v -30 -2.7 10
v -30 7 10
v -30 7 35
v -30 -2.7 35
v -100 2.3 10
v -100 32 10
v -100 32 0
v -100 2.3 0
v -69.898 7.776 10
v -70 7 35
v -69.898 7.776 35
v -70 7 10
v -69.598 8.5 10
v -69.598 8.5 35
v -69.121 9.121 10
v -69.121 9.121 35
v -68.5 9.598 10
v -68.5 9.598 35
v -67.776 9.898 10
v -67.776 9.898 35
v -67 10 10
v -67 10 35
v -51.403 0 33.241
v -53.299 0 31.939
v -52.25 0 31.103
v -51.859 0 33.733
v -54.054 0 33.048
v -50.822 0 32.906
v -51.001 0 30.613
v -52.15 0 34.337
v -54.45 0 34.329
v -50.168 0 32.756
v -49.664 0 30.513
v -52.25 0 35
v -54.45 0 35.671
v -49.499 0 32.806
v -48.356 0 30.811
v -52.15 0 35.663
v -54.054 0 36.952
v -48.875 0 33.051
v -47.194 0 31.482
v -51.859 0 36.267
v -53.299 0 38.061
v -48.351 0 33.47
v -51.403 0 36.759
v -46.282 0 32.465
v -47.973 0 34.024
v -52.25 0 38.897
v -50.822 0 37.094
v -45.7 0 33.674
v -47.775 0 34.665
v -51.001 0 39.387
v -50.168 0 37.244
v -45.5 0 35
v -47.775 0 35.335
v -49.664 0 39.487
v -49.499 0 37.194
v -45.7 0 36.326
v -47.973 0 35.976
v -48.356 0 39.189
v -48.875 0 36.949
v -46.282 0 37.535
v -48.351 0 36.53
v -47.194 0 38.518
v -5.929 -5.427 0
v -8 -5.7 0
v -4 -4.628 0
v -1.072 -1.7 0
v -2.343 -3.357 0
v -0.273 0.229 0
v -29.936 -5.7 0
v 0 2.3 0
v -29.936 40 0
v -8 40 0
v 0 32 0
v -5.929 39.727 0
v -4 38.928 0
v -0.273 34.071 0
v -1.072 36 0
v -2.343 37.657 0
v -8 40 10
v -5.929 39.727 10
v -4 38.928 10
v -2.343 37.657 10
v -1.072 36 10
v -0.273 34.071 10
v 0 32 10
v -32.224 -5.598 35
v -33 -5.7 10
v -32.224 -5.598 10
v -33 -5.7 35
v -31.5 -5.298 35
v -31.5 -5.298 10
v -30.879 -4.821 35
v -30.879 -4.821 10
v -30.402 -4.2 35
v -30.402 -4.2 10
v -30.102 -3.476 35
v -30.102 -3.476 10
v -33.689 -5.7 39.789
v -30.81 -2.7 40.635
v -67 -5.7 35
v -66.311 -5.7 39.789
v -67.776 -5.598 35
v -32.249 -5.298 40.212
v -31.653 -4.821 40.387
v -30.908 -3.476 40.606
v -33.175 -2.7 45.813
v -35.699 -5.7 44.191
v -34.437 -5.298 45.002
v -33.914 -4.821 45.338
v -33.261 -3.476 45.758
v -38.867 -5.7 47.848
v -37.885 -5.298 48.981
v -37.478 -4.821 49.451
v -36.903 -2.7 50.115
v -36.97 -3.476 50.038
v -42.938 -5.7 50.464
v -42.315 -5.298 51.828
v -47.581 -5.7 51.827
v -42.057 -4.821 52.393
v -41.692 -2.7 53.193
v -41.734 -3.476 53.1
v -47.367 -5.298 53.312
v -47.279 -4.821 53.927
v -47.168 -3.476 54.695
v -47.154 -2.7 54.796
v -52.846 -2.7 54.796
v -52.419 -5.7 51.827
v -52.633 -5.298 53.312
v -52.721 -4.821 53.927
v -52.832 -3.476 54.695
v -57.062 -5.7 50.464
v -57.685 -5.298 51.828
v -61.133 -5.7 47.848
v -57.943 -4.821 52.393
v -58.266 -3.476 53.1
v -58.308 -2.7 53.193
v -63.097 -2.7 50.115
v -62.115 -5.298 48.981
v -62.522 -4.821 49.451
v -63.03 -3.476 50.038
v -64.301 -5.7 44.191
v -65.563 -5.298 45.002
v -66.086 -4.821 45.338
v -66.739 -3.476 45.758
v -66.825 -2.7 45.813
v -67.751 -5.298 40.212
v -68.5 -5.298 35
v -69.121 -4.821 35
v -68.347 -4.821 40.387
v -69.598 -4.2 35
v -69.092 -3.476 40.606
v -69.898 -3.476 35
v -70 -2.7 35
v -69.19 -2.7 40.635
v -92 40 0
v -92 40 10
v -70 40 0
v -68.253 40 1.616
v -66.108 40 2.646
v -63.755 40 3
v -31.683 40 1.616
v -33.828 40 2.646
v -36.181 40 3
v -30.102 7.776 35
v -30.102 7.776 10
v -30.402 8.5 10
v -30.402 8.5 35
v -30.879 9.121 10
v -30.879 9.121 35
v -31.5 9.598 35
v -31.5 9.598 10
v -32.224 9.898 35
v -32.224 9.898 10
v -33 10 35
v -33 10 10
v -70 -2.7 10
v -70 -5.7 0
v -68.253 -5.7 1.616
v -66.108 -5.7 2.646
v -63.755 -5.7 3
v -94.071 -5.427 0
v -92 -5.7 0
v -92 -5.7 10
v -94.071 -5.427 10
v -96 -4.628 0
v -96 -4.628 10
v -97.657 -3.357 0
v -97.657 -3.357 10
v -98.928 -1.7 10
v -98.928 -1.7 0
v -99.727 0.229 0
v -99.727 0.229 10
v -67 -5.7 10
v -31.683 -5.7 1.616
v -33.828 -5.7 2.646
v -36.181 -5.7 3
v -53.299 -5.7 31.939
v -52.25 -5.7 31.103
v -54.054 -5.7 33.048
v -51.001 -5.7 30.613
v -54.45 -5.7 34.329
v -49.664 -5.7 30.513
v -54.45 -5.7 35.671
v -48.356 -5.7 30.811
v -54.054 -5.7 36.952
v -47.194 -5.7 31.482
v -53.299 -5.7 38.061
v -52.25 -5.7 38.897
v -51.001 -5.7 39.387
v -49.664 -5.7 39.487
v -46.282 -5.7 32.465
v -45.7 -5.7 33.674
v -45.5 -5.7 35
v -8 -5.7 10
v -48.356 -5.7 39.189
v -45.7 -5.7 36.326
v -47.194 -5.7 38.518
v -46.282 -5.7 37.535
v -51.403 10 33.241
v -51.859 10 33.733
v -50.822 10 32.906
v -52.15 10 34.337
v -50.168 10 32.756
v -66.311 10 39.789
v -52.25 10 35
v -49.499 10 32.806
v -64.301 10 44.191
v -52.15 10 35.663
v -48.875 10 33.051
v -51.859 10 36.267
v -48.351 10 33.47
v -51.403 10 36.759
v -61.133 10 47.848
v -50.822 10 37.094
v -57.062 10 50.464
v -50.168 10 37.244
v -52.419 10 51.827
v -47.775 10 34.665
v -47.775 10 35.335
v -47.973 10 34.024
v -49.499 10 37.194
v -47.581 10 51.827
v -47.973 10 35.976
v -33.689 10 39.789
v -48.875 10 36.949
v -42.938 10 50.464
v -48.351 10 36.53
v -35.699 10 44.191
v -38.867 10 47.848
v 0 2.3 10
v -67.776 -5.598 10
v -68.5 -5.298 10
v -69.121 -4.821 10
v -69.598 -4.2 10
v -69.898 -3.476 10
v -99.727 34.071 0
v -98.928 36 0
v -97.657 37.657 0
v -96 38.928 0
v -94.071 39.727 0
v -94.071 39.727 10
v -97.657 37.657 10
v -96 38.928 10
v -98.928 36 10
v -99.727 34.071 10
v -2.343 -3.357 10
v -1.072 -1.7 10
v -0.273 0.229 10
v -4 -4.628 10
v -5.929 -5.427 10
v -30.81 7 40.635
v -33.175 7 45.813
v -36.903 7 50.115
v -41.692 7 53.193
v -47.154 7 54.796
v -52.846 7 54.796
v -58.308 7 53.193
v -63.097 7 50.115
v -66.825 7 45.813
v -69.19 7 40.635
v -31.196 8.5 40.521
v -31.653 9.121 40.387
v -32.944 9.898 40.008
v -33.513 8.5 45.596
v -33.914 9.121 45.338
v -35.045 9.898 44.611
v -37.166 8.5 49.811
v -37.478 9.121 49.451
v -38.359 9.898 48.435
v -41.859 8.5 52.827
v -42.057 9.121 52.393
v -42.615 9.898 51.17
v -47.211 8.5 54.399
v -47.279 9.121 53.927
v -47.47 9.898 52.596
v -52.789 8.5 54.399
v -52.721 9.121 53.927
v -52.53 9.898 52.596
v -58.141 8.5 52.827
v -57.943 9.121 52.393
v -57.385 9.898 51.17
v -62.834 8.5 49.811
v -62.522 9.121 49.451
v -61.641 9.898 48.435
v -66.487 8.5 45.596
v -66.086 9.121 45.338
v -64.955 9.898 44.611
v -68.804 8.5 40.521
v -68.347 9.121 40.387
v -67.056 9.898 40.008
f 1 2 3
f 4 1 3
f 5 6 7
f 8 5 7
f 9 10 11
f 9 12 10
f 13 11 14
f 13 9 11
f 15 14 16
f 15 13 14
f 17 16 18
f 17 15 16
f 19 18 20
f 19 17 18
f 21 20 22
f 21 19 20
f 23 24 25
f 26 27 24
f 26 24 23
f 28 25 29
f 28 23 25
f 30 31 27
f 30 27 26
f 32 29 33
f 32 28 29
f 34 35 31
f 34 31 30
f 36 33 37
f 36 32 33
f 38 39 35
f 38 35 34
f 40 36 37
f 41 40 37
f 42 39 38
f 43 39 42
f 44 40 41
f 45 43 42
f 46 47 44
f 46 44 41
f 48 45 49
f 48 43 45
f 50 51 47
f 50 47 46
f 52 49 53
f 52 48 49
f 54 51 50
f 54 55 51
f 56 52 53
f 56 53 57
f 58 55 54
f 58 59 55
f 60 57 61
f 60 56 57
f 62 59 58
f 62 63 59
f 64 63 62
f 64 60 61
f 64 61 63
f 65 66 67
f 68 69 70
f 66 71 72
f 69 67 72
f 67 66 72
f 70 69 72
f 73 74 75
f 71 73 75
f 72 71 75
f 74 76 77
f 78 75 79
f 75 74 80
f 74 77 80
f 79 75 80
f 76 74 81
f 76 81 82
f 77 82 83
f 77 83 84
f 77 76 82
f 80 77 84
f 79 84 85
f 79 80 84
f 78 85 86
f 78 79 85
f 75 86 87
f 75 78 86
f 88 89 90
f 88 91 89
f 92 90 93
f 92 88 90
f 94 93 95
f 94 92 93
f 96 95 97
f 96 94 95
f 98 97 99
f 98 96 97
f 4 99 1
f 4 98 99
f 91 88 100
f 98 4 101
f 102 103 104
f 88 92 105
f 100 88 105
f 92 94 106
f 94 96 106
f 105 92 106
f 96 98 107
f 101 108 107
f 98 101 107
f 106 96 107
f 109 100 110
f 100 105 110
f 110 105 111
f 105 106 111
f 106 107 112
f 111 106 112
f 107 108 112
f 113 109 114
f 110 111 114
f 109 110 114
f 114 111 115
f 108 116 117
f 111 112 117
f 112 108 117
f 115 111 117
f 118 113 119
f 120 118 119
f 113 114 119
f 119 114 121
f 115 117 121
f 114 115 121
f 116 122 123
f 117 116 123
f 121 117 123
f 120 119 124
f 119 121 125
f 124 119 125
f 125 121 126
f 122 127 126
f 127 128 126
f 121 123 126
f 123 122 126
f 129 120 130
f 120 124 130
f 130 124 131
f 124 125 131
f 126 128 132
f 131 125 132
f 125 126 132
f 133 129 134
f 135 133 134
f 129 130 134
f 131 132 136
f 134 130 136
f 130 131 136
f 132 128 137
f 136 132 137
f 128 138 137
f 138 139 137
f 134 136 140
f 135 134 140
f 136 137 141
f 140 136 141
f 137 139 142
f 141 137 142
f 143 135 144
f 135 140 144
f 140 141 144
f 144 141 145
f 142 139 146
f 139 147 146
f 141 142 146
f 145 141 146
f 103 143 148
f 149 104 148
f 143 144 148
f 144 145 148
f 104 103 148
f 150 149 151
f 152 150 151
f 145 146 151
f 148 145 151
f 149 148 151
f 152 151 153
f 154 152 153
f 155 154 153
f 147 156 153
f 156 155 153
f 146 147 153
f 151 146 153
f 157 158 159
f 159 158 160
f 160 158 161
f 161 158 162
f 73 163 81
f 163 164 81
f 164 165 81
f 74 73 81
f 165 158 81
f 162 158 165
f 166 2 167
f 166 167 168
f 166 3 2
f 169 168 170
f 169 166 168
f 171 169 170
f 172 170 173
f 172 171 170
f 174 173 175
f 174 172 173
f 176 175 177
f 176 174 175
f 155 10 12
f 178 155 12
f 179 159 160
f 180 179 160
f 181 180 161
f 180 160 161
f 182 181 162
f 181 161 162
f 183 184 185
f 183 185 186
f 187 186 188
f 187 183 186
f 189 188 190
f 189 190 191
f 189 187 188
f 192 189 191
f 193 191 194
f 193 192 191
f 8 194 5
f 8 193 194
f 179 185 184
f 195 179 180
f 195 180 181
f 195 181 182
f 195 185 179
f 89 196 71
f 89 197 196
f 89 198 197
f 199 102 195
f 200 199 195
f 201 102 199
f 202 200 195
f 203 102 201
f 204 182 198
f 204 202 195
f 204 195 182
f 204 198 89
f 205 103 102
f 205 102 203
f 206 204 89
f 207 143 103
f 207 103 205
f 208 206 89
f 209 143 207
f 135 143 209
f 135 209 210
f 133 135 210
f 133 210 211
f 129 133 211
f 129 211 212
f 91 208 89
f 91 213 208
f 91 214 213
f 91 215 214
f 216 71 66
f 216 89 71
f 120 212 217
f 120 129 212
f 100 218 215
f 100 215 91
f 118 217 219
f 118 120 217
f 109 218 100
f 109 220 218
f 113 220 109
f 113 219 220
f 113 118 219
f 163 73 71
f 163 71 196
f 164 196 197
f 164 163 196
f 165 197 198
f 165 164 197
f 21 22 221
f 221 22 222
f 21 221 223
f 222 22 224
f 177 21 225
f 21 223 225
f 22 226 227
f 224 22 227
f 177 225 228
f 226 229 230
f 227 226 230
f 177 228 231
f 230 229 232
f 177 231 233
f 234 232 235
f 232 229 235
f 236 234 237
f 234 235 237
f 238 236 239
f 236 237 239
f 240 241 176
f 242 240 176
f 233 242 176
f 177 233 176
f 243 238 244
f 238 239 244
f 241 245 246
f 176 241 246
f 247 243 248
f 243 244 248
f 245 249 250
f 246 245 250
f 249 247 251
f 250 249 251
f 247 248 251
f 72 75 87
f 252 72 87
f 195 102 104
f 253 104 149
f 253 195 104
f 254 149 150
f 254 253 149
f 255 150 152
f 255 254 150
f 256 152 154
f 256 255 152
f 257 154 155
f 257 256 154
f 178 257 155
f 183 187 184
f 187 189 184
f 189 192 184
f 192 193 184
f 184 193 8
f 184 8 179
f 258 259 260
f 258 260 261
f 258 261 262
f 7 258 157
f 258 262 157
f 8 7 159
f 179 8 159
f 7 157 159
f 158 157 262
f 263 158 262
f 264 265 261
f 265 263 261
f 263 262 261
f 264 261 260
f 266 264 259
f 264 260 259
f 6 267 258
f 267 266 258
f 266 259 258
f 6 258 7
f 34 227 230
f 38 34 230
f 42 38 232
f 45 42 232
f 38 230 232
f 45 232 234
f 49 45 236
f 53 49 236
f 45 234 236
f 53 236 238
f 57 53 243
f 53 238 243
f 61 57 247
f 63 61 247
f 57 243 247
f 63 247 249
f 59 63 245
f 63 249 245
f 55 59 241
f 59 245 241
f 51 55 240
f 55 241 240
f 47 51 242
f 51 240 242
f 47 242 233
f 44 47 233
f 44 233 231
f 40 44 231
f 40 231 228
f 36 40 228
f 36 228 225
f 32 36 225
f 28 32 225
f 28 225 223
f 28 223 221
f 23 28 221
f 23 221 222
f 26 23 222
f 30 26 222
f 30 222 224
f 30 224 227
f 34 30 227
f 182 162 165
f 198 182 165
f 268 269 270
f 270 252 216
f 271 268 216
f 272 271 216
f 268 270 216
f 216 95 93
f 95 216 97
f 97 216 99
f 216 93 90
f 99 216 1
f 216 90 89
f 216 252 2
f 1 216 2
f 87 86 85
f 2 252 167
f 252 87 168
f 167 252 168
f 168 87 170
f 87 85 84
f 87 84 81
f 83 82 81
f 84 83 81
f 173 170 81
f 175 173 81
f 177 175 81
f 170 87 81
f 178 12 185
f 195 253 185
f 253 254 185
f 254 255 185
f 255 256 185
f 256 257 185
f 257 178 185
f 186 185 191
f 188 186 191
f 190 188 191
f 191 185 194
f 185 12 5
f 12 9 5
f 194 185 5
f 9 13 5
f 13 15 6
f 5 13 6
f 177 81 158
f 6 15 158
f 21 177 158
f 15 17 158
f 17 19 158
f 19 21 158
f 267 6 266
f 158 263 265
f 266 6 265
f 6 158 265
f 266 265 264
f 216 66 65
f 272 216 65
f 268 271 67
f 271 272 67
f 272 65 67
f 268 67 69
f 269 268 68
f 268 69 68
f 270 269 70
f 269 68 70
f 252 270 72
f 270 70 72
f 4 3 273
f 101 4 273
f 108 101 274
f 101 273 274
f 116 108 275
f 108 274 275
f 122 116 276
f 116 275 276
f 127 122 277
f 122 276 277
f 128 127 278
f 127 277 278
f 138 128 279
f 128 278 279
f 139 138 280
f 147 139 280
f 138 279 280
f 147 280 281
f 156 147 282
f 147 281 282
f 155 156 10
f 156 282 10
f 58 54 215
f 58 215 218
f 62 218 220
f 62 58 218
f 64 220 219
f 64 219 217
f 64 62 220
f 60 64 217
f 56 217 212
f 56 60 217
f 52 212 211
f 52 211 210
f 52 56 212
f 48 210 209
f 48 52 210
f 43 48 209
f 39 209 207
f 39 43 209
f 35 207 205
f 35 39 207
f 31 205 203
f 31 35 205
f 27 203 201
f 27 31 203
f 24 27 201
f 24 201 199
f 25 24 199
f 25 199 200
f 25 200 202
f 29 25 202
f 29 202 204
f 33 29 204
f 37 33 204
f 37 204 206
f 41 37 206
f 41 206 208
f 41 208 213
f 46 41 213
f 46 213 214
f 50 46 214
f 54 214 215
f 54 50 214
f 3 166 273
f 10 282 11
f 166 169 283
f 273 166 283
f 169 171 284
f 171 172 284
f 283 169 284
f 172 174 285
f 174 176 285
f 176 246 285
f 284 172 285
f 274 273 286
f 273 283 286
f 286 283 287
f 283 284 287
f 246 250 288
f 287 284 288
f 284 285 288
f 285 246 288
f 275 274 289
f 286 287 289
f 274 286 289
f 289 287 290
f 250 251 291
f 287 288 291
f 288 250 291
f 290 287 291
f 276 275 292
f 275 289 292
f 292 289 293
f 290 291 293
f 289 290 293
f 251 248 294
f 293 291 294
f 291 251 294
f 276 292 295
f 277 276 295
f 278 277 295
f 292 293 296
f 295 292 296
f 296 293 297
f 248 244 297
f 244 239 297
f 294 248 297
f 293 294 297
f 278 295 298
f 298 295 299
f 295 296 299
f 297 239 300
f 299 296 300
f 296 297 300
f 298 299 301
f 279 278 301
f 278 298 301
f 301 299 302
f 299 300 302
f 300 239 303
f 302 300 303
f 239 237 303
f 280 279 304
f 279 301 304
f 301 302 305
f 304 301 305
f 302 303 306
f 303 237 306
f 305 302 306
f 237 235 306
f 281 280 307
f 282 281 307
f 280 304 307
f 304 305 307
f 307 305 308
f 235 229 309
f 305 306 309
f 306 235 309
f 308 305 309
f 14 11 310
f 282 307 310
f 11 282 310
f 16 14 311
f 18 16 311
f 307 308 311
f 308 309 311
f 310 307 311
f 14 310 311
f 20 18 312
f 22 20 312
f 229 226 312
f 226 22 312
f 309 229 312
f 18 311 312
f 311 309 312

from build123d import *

# Parameters (mm, degrees)
F0_W          = 100
F0_H          = 40
F1_DEPTH      = 10
F3_DEPTH      = 10
F4_W          = 40.0635205954
F4_H          = 3
F5_DEPTH      = 40.001
F6_R          = 2.25
F7_DEPTH      = 10.001
F8_R          = 4.5
F10_DEPTH     = 5.7
F11_T1_DEPTH  = 45.7
F11_T3_DEPTH  = 45.7
F11_T5_DEPTH  = 50
F11_T7_DEPTH  = 50
F11_T9_DEPTH  = 50
F11_T11_DEPTH = 50
F12_R         = 3


# Not quite as in the source:
# - a fillet or chamfer that OpenCascade refuses, or shapes differently, is made with other operations: its cross-section is extruded or revolved along the edge and cut away or added
# - the program builds the solid bodies; features that only make, move or delete a surface that nothing else refers to are left out


with BuildPart() as f1:
    # F0 (on Top) → F1 (new body)
    with BuildSketch(Plane.XY):
        with Locations((-50, 20)):
            Rectangle(F0_W, F0_H)
    extrude(amount=F1_DEPTH)

    # F2 (on face) → F3 (join)
    with BuildSketch(Plane.XZ):
        with BuildLine():
            ThreePointArc((-30, 35), (-50, 55), (-70, 35))
            Line((-70, 35), (-70, 0))
            Line((-70, 0), (-30, 0))
            Line((-30, 0), (-30, 35))
        make_face()
    extrude(amount=-F3_DEPTH)

    # F4 (on face) → F5 (cut, through all)
    with BuildSketch(Plane.XZ):
        with Locations((-49.9682397023, 1.5)):
            Rectangle(F4_W, F4_H)
    extrude(amount=-F5_DEPTH, mode=Mode.SUBTRACT)

    # F6 (on face) → F7 (cut, through all)
    with BuildSketch(Plane(origin=(0, 10, 0), x_dir=(-1, 0, 0), z_dir=(0, 1, 0))):
        with Locations((50, 35)):
            Circle(F6_R)
    extrude(amount=-F7_DEPTH, mode=Mode.SUBTRACT)

    # F8 (on face) → F10 (join)
    with BuildSketch(Plane.XZ):
        with BuildLine():
            Line((-100, 10), (-100, 0))
            Line((-100, 0), (-70, 0))
            Line((-70, 0), (-70, 3))
            Line((-70, 3), (-29.9364794046, 3))
            Line((-29.9364794046, 3), (-29.9364794046, 0))
            Line((-29.9364794046, 0), (0, 0))
            Line((0, 0), (0, 10))
            Line((0, 10), (-30, 10))
            Line((-30, 10), (-30, 35))
            ThreePointArc((-30, 35), (-50, 55), (-70, 35))
            Line((-70, 35), (-70, 10))
            Line((-70, 10), (-100, 10))
        make_face()
        with Locations((-50, 35)):
            Circle(F8_R, mode=Mode.SUBTRACT)
    extrude(amount=F10_DEPTH)

    # F11: fillet of radius 8 on 8 edges, made by hand

    # F11_s2 → F11_t1 (join)
    with BuildSketch(Plane.XZ.offset(-40)):
        with BuildLine():
            ThreePointArc((-29.9364794046, 0), (-32.7173757878, 2.2111025509), (-36.181477403, 3))
            Line((-36.181477403, 3), (-29.9364794046, 3))
            Line((-29.9364794046, 3), (-29.9364794046, 0))
        make_face()
    extrude(amount=F11_T1_DEPTH)

    # F11_s4 → F11_t3 (join)
    with BuildSketch(Plane.XZ.offset(-40)):
        with BuildLine():
            ThreePointArc((-70, 0), (-67.2191036167, 2.2111025509), (-63.7550020016, 3))
            Line((-63.7550020016, 3), (-70, 3))
            Line((-70, 3), (-70, 0))
        make_face()
    extrude(amount=F11_T3_DEPTH)

    # F11_s6 → F11_t5 (cut)
    with BuildSketch(Plane.XY.offset(-20)):
        with BuildLine():
            ThreePointArc((-92, -5.7), (-97.6568542495, -3.3568542495), (-100, 2.3))
            Line((-100, 2.3), (-100, -5.7))
            Line((-100, -5.7), (-92, -5.7))
        make_face()
    extrude(amount=F11_T5_DEPTH, mode=Mode.SUBTRACT)

    # F11_s8 → F11_t7 (cut)
    with BuildSketch(Plane.XY.offset(-20)):
        with BuildLine():
            ThreePointArc((-8, -5.7), (-2.3431457505, -3.3568542495), (0, 2.3))
            Line((0, 2.3), (0, -5.7))
            Line((0, -5.7), (-8, -5.7))
        make_face()
    extrude(amount=F11_T7_DEPTH, mode=Mode.SUBTRACT)

    # F11_s10 → F11_t9 (cut)
    with BuildSketch(Plane.XY.offset(-20)):
        with BuildLine():
            ThreePointArc((-8, 40), (-2.3431457505, 37.6568542495), (0, 32))
            Line((0, 32), (0, 40))
            Line((0, 40), (-8, 40))
        make_face()
    extrude(amount=F11_T9_DEPTH, mode=Mode.SUBTRACT)

    # F11_s12 → F11_t11 (cut)
    with BuildSketch(Plane.XY.offset(-20)):
        with BuildLine():
            ThreePointArc((-92, 40), (-97.6568542495, 37.6568542495), (-100, 32))
            Line((-100, 32), (-100, 40))
            Line((-100, 40), (-92, 40))
        make_face()
    extrude(amount=F11_T11_DEPTH, mode=Mode.SUBTRACT)

    # F12
    f12_edges = [f1.edges().sort_by_distance(p)[0] for p in [
        (-30, -5.7, 22.5),
        (-50, -5.7, 55),
        (-50, 10, 55),
        (-70, -5.7, 22.5),
        (-30, 10, 22.5),
        (-70, 10, 22.5),
    ]]
    fillet(f12_edges, radius=F12_R)


solid = f1.part
